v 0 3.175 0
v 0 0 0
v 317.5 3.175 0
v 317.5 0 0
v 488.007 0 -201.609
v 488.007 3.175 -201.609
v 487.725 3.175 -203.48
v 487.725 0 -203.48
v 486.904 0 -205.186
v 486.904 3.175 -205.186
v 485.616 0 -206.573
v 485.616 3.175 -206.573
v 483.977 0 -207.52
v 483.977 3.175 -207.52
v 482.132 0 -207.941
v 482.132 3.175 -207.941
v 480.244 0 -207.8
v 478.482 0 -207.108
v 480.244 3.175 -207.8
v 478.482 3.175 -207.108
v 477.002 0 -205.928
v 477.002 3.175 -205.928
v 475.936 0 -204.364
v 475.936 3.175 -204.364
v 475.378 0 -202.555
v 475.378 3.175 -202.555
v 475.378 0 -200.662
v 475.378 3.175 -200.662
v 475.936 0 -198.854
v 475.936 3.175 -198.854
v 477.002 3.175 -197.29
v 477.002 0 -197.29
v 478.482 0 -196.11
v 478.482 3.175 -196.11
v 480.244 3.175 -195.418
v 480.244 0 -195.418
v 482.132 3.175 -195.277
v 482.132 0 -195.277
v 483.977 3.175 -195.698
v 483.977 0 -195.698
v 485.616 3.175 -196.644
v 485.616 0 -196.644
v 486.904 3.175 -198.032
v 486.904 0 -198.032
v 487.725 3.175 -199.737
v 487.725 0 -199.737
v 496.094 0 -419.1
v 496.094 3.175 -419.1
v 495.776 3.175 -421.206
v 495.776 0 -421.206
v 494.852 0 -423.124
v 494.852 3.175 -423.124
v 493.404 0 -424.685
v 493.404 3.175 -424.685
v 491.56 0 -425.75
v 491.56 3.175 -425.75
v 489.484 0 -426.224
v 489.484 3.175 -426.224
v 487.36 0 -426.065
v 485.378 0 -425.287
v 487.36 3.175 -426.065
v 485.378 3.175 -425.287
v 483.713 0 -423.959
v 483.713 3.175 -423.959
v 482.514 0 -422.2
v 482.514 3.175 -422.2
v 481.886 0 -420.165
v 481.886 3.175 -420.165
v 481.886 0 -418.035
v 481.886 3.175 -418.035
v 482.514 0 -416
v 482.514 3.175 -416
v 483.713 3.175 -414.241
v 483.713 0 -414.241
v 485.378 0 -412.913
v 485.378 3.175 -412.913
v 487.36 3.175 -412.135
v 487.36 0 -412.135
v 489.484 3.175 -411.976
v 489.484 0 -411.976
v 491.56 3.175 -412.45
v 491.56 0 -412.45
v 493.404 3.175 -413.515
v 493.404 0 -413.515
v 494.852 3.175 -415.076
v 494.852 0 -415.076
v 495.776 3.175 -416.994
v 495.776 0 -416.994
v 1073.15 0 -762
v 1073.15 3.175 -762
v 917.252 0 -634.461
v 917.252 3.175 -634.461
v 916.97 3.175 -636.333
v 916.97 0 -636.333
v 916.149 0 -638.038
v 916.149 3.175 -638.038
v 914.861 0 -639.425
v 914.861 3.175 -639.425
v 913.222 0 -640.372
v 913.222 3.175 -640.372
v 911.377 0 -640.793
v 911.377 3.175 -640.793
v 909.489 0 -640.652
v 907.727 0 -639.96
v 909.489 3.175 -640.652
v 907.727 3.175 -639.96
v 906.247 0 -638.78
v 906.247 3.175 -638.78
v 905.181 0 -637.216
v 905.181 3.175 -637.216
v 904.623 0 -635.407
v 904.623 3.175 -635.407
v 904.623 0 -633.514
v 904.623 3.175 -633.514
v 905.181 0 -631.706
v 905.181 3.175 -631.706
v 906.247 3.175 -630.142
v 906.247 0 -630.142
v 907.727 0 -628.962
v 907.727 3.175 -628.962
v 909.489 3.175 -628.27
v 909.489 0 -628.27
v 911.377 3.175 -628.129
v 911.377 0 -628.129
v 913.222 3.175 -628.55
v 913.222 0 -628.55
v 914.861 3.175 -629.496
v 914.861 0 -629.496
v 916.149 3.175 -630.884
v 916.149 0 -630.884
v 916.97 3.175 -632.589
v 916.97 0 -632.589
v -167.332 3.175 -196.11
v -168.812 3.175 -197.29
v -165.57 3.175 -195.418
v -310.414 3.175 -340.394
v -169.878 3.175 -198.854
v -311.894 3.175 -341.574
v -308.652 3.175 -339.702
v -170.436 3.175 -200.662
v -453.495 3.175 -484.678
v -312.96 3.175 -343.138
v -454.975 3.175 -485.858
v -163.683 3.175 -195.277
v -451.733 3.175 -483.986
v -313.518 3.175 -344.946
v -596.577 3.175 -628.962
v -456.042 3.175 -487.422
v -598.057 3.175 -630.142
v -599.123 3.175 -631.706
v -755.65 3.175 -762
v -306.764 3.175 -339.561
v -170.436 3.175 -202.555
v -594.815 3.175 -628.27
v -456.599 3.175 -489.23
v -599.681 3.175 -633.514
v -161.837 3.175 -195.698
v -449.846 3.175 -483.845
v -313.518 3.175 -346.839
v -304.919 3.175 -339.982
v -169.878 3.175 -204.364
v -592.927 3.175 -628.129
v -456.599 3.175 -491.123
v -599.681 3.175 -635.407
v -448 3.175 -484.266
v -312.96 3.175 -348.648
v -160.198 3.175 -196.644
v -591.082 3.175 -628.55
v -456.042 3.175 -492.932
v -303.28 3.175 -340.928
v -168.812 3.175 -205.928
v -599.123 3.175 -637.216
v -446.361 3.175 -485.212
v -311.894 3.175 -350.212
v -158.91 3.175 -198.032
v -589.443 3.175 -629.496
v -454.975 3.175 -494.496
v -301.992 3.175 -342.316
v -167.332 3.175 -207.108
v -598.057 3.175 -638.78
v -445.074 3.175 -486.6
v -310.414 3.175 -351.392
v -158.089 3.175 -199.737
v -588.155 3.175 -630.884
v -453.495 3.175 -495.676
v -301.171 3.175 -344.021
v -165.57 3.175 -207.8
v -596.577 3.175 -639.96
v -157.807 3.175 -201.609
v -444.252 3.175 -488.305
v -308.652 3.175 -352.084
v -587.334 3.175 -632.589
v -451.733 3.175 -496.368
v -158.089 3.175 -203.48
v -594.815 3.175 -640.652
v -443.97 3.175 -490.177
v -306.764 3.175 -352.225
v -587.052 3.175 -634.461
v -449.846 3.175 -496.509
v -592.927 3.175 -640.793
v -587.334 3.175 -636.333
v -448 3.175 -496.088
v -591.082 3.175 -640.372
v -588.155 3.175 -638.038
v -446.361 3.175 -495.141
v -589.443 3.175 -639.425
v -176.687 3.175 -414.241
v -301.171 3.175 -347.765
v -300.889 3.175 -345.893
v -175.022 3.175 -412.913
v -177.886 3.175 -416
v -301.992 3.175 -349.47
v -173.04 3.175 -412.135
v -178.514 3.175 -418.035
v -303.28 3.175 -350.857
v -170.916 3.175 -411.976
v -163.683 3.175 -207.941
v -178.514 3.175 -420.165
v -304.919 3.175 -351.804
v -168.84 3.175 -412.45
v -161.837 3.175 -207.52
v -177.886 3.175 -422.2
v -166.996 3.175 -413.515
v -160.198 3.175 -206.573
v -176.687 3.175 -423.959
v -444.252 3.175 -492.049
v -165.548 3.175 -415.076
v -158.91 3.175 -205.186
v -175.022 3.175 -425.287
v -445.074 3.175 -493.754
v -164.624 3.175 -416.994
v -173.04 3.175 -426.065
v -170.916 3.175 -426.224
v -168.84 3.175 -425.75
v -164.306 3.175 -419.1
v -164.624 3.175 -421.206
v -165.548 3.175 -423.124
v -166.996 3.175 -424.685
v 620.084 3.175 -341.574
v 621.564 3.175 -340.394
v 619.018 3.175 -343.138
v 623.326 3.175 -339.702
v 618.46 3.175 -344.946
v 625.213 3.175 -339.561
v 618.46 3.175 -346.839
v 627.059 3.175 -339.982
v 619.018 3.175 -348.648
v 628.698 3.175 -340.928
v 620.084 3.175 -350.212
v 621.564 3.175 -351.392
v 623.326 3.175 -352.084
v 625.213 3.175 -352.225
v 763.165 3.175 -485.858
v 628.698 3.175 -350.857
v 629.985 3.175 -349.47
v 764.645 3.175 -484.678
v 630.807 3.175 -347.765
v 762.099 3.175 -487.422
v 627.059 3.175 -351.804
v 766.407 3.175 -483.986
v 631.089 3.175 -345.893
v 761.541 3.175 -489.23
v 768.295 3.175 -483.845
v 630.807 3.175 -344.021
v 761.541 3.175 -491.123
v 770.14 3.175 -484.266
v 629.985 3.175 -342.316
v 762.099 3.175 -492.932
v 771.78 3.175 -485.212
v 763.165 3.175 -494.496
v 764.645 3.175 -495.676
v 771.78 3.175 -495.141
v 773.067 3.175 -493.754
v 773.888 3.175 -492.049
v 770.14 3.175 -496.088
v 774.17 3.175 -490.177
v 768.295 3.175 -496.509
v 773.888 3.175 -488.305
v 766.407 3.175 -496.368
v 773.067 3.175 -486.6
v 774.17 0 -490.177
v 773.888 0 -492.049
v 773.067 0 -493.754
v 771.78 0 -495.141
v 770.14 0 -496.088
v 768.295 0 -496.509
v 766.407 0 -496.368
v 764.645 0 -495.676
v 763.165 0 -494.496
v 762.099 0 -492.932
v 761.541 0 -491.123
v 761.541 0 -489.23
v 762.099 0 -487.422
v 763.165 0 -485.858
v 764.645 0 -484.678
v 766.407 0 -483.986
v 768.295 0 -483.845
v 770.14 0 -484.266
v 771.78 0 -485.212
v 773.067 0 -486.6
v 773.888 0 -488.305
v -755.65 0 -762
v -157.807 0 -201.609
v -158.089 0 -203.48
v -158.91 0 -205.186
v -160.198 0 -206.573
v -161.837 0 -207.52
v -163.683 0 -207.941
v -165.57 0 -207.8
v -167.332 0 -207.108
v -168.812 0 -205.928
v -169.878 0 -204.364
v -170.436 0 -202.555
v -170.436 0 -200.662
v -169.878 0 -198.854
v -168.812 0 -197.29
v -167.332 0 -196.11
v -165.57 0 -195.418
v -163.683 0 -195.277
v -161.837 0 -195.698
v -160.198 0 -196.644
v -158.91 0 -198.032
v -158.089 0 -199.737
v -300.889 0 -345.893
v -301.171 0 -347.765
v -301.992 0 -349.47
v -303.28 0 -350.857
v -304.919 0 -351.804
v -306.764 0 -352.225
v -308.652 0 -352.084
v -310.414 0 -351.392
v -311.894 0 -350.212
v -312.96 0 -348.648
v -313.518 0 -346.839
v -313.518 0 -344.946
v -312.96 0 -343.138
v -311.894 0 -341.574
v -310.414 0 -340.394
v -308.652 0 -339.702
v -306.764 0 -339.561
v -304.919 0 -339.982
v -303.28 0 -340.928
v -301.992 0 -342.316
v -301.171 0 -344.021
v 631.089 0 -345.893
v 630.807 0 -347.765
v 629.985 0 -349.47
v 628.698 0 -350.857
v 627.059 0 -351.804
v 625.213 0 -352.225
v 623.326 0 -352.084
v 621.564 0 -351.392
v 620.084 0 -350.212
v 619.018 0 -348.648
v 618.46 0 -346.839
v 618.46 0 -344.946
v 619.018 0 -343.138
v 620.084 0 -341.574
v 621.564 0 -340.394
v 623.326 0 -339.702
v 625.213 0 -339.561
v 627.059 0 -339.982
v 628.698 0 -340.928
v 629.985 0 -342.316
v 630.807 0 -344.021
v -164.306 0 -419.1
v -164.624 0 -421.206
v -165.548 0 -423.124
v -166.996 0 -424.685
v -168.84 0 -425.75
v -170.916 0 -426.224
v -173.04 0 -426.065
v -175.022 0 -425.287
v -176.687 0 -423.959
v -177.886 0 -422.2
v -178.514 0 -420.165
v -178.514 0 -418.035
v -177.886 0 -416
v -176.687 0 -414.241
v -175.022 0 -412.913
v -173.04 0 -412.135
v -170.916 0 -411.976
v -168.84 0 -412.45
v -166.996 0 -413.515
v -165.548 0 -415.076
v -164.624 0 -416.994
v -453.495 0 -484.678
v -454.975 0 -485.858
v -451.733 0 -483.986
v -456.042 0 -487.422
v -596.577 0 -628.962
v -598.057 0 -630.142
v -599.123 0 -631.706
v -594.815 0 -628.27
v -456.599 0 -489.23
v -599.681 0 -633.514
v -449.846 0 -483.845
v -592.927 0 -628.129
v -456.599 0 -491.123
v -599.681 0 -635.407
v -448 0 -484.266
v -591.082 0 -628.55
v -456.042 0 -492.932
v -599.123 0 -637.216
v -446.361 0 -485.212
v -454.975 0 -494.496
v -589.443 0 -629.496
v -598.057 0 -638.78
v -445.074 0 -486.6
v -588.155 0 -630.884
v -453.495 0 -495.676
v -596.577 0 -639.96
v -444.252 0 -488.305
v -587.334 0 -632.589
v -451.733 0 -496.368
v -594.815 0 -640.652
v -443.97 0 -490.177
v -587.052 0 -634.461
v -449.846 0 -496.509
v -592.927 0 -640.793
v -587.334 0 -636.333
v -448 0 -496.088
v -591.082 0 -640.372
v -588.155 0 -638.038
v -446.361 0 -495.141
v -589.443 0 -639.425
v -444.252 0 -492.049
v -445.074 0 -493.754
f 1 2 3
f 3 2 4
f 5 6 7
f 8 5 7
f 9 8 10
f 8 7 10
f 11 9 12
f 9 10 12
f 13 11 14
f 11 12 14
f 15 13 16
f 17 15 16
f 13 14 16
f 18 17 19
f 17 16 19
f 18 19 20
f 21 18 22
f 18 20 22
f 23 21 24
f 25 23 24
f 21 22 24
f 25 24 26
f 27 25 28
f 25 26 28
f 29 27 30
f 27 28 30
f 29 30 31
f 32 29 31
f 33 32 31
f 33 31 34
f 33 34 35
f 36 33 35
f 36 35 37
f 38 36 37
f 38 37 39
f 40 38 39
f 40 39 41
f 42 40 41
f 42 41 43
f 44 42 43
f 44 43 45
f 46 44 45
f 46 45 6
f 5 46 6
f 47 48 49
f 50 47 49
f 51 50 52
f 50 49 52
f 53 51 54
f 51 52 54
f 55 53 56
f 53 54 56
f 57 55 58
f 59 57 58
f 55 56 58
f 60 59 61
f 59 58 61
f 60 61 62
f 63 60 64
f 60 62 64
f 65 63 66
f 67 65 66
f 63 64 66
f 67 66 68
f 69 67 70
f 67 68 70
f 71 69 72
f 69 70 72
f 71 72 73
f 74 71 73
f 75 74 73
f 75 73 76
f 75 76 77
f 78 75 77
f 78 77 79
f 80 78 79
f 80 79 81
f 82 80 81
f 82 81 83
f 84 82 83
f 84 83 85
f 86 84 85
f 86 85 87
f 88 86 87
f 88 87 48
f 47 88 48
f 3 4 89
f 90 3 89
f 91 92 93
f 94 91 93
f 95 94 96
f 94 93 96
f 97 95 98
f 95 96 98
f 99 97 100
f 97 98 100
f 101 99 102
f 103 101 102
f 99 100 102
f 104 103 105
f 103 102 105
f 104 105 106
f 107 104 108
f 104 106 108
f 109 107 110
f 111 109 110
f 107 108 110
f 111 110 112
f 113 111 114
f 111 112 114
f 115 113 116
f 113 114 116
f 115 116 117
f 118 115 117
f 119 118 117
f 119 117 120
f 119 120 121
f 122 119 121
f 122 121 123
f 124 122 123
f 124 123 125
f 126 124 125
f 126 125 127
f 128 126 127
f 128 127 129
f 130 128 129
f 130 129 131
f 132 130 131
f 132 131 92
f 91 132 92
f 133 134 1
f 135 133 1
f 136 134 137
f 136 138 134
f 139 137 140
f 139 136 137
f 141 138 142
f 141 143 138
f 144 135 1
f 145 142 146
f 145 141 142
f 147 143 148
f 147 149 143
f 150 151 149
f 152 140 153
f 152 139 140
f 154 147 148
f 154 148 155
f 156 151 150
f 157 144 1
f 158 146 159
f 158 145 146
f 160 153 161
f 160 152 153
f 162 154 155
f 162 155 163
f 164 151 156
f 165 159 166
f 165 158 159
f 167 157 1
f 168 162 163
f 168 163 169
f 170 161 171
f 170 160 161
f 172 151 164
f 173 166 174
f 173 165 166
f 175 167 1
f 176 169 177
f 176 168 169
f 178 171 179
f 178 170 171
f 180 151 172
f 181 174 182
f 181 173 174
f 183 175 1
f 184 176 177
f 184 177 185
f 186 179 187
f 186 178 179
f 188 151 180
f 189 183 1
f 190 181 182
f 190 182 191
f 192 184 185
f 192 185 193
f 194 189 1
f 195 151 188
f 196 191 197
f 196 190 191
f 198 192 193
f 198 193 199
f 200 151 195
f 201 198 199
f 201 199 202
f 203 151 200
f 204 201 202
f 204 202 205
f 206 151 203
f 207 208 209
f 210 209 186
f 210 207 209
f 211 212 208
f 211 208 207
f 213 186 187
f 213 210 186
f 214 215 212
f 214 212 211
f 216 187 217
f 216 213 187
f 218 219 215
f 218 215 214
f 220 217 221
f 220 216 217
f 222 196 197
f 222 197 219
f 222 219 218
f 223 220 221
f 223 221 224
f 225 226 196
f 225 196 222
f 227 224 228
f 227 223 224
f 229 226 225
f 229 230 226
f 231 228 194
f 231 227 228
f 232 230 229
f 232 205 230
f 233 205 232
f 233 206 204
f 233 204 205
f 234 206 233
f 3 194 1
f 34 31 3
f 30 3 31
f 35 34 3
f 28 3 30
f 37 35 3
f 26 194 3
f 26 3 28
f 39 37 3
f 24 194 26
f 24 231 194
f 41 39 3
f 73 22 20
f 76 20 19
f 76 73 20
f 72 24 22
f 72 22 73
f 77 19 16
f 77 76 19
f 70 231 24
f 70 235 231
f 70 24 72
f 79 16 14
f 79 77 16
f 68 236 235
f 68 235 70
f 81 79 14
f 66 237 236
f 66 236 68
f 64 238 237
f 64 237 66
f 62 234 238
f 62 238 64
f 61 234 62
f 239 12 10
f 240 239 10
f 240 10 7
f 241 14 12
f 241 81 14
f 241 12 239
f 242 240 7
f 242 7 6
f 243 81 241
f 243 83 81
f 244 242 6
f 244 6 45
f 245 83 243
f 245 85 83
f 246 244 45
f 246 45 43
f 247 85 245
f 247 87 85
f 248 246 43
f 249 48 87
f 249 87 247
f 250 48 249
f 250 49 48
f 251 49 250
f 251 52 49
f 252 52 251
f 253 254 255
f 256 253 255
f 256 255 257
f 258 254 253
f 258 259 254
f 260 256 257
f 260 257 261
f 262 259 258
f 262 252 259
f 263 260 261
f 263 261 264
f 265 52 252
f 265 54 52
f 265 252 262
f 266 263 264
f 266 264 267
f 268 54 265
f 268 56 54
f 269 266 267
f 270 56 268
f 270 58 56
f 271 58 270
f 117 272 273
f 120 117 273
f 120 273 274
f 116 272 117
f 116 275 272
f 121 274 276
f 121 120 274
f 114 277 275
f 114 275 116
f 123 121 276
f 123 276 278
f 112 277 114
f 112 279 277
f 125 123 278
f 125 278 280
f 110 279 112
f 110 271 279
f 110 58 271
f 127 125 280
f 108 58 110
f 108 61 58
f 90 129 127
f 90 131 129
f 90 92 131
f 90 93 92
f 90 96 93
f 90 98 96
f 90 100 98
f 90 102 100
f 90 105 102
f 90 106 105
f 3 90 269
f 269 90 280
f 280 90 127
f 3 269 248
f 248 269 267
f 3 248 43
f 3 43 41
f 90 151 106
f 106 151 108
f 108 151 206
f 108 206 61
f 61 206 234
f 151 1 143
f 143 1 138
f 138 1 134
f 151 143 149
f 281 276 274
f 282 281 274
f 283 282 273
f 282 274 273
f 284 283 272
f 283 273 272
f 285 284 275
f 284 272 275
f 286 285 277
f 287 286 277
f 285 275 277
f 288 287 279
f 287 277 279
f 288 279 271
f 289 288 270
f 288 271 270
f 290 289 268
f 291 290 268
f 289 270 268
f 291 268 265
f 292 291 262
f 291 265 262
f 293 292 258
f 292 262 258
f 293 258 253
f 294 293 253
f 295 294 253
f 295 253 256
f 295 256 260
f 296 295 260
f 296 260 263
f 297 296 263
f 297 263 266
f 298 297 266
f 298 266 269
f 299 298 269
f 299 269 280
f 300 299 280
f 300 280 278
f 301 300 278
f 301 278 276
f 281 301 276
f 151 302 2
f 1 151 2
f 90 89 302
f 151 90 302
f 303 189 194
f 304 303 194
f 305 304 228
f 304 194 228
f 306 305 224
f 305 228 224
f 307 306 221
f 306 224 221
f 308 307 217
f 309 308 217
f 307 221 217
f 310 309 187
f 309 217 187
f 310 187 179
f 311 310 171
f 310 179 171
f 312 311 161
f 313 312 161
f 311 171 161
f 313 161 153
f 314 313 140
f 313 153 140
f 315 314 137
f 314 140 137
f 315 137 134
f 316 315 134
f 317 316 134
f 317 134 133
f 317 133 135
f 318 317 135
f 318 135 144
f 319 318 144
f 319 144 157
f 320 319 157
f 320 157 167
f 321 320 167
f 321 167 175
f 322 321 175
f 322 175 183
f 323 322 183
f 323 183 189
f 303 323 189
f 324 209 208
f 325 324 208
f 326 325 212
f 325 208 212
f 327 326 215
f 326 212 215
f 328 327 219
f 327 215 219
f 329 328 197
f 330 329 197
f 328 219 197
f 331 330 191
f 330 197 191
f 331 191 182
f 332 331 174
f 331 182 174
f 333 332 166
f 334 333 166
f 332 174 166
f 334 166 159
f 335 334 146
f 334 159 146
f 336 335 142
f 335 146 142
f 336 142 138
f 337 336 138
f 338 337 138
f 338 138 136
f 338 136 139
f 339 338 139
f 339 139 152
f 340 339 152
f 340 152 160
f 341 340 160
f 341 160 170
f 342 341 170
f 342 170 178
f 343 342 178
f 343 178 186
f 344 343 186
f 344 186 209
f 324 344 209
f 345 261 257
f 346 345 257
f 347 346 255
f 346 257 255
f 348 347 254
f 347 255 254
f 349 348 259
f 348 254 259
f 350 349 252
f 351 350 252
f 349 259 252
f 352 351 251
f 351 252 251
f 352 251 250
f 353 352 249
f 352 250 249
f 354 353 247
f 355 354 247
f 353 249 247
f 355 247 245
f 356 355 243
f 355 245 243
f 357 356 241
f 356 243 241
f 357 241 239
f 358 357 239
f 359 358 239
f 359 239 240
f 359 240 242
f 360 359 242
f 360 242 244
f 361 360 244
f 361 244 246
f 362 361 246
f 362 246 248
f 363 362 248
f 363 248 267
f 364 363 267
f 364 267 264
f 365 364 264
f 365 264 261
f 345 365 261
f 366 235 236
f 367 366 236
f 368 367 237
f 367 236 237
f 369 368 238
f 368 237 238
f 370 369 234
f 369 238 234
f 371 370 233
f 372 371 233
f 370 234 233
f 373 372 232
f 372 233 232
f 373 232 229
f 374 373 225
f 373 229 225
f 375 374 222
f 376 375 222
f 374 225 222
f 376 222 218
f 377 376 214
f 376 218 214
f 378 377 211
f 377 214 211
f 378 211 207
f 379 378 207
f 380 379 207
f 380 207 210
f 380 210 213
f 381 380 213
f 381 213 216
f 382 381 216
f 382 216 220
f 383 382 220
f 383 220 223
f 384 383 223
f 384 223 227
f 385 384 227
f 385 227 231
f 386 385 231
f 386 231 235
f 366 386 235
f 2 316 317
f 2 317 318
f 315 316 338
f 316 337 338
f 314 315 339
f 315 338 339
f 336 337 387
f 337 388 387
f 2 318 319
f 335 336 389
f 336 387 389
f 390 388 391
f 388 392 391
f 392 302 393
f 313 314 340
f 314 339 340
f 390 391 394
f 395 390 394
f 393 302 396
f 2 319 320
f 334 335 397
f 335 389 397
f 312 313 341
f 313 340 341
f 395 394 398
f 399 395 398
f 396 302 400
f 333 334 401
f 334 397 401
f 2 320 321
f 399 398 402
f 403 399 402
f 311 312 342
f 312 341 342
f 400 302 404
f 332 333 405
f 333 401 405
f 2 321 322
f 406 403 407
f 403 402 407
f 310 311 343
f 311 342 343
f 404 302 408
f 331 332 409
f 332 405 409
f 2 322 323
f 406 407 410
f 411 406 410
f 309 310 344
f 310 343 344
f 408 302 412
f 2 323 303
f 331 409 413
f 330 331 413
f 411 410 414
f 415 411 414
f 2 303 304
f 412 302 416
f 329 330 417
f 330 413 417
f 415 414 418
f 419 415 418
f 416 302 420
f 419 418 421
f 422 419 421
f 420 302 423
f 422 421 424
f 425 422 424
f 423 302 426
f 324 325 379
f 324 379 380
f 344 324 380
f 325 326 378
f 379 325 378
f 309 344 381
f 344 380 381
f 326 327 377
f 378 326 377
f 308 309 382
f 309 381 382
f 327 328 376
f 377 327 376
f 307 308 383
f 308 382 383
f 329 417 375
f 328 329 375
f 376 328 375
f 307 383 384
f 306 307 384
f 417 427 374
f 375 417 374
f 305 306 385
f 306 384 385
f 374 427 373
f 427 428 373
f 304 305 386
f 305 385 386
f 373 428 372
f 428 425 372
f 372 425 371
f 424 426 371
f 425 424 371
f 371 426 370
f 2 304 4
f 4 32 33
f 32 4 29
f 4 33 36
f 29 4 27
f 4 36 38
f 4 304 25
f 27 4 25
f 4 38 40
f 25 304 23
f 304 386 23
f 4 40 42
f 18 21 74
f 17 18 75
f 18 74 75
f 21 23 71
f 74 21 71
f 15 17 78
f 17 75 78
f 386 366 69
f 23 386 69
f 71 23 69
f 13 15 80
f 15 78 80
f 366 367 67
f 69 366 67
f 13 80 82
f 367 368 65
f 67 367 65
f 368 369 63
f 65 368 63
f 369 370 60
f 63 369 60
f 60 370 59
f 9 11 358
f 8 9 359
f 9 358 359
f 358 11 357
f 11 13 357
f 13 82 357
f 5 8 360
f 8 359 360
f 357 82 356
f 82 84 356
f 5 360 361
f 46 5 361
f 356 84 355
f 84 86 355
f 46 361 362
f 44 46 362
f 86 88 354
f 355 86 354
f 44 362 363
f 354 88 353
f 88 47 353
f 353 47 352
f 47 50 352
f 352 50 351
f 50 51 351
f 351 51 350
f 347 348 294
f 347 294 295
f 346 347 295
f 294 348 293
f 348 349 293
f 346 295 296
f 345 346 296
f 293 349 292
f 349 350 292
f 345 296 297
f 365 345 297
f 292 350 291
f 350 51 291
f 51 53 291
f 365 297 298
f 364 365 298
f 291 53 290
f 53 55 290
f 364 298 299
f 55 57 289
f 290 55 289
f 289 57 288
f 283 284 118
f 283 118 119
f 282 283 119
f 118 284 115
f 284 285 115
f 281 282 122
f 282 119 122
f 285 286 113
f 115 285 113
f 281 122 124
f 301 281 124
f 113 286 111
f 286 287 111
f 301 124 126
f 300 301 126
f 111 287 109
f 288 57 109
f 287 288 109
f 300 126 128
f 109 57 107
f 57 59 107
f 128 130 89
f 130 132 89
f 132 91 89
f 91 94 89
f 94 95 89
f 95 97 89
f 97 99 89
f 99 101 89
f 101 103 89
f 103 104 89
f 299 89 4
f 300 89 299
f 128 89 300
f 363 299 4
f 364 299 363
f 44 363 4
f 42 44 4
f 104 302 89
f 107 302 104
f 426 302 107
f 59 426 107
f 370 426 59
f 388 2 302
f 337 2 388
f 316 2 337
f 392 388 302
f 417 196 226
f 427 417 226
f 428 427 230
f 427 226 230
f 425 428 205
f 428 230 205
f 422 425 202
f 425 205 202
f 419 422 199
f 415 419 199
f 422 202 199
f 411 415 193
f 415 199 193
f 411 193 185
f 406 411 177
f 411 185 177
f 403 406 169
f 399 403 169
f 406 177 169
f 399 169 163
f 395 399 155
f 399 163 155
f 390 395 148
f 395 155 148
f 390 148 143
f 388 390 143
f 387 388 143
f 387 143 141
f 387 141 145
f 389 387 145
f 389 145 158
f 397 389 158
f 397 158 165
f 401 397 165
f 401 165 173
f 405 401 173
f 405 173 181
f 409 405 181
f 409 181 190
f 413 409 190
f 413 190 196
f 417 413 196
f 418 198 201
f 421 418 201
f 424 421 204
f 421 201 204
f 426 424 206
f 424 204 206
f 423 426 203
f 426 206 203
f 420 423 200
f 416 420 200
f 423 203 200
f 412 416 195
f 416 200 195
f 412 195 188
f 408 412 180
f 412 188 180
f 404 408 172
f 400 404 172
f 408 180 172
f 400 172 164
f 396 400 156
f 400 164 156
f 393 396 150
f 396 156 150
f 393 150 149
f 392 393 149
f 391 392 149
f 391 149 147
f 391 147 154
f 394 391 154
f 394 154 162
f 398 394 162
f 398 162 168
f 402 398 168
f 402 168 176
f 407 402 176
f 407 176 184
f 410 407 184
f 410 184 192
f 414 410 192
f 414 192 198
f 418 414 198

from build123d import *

# Parameters (mm, degrees)
BOSS_EXTRUDE1_DEPTH = 3.175
CUT_EXTRUDE1_REACH  = 5.175
SKETCH2_R           = 7.14375
SKETCH3_R           = 6.35
CUT_EXTRUDE2_DEPTH  = 4.175


with BuildPart() as part:
    # Sketch1 → Boss-Extrude1 (new body)
    with BuildSketch(Plane(origin=(0, 0, 0), x_dir=(1, 0, 0), z_dir=(0, 1, 0))):
        Polygon((0, 0), (317.5, 0), (1073.15, 762), (-755.65, 762), align=None)
    extrude(amount=BOSS_EXTRUDE1_DEPTH)

    # Sketch2 → Cut-Extrude1 (cut, up to next)
    with BuildSketch(Plane(origin=(0, 3.175, 0), x_dir=(1, 0, 0), z_dir=(0, 1, 0)), mode=Mode.PRIVATE) as cut_extrude1_sk1:
        with Locations((-171.45, 419.1)):
            Circle(SKETCH2_R)
    cut_extrude1_tool1 = extrude(cut_extrude1_sk1.sketch, amount=-CUT_EXTRUDE1_REACH, mode=Mode.PRIVATE) & part.part
    add(cut_extrude1_tool1.solids().sort_by_distance((-171.45, 3.175, -419.1))[0], mode=Mode.SUBTRACT)
    # Sketch2 → Cut-Extrude1 (cut, up to next)
    with BuildSketch(Plane(origin=(0, 3.175, 0), x_dir=(1, 0, 0), z_dir=(0, 1, 0)), mode=Mode.PRIVATE) as cut_extrude1_sk2:
        with Locations((488.95, 419.1)):
            Circle(SKETCH2_R)
    cut_extrude1_tool2 = extrude(cut_extrude1_sk2.sketch, amount=-CUT_EXTRUDE1_REACH, mode=Mode.PRIVATE) & part.part
    add(cut_extrude1_tool2.solids().sort_by_distance((488.95, 3.175, -419.1))[0], mode=Mode.SUBTRACT)

    # Sketch3 → Cut-Extrude2 (cut, through all)
    with BuildSketch(Plane(origin=(0, 3.175, 0), x_dir=(1, 0, 0), z_dir=(0, 1, 0))):
        with Locations((-593.402017408, 634.460857891)):
            Circle(SKETCH3_R)
        with Locations((-450.320360604, 490.176834222)):
            Circle(SKETCH3_R)
        with Locations((-307.238703799, 345.892810554)):
            Circle(SKETCH3_R)
        with Locations((-164.157046994, 201.608786885)):
            Circle(SKETCH3_R)
        with Locations((481.657046994, 201.608786885)):
            Circle(SKETCH3_R)
        with Locations((624.738703799, 345.892810554)):
            Circle(SKETCH3_R)
        with Locations((767.820360604, 490.176834222)):
            Circle(SKETCH3_R)
        with Locations((910.902017408, 634.460857891)):
            Circle(SKETCH3_R)
    extrude(amount=-CUT_EXTRUDE2_DEPTH, mode=Mode.SUBTRACT)


solid = part.part
